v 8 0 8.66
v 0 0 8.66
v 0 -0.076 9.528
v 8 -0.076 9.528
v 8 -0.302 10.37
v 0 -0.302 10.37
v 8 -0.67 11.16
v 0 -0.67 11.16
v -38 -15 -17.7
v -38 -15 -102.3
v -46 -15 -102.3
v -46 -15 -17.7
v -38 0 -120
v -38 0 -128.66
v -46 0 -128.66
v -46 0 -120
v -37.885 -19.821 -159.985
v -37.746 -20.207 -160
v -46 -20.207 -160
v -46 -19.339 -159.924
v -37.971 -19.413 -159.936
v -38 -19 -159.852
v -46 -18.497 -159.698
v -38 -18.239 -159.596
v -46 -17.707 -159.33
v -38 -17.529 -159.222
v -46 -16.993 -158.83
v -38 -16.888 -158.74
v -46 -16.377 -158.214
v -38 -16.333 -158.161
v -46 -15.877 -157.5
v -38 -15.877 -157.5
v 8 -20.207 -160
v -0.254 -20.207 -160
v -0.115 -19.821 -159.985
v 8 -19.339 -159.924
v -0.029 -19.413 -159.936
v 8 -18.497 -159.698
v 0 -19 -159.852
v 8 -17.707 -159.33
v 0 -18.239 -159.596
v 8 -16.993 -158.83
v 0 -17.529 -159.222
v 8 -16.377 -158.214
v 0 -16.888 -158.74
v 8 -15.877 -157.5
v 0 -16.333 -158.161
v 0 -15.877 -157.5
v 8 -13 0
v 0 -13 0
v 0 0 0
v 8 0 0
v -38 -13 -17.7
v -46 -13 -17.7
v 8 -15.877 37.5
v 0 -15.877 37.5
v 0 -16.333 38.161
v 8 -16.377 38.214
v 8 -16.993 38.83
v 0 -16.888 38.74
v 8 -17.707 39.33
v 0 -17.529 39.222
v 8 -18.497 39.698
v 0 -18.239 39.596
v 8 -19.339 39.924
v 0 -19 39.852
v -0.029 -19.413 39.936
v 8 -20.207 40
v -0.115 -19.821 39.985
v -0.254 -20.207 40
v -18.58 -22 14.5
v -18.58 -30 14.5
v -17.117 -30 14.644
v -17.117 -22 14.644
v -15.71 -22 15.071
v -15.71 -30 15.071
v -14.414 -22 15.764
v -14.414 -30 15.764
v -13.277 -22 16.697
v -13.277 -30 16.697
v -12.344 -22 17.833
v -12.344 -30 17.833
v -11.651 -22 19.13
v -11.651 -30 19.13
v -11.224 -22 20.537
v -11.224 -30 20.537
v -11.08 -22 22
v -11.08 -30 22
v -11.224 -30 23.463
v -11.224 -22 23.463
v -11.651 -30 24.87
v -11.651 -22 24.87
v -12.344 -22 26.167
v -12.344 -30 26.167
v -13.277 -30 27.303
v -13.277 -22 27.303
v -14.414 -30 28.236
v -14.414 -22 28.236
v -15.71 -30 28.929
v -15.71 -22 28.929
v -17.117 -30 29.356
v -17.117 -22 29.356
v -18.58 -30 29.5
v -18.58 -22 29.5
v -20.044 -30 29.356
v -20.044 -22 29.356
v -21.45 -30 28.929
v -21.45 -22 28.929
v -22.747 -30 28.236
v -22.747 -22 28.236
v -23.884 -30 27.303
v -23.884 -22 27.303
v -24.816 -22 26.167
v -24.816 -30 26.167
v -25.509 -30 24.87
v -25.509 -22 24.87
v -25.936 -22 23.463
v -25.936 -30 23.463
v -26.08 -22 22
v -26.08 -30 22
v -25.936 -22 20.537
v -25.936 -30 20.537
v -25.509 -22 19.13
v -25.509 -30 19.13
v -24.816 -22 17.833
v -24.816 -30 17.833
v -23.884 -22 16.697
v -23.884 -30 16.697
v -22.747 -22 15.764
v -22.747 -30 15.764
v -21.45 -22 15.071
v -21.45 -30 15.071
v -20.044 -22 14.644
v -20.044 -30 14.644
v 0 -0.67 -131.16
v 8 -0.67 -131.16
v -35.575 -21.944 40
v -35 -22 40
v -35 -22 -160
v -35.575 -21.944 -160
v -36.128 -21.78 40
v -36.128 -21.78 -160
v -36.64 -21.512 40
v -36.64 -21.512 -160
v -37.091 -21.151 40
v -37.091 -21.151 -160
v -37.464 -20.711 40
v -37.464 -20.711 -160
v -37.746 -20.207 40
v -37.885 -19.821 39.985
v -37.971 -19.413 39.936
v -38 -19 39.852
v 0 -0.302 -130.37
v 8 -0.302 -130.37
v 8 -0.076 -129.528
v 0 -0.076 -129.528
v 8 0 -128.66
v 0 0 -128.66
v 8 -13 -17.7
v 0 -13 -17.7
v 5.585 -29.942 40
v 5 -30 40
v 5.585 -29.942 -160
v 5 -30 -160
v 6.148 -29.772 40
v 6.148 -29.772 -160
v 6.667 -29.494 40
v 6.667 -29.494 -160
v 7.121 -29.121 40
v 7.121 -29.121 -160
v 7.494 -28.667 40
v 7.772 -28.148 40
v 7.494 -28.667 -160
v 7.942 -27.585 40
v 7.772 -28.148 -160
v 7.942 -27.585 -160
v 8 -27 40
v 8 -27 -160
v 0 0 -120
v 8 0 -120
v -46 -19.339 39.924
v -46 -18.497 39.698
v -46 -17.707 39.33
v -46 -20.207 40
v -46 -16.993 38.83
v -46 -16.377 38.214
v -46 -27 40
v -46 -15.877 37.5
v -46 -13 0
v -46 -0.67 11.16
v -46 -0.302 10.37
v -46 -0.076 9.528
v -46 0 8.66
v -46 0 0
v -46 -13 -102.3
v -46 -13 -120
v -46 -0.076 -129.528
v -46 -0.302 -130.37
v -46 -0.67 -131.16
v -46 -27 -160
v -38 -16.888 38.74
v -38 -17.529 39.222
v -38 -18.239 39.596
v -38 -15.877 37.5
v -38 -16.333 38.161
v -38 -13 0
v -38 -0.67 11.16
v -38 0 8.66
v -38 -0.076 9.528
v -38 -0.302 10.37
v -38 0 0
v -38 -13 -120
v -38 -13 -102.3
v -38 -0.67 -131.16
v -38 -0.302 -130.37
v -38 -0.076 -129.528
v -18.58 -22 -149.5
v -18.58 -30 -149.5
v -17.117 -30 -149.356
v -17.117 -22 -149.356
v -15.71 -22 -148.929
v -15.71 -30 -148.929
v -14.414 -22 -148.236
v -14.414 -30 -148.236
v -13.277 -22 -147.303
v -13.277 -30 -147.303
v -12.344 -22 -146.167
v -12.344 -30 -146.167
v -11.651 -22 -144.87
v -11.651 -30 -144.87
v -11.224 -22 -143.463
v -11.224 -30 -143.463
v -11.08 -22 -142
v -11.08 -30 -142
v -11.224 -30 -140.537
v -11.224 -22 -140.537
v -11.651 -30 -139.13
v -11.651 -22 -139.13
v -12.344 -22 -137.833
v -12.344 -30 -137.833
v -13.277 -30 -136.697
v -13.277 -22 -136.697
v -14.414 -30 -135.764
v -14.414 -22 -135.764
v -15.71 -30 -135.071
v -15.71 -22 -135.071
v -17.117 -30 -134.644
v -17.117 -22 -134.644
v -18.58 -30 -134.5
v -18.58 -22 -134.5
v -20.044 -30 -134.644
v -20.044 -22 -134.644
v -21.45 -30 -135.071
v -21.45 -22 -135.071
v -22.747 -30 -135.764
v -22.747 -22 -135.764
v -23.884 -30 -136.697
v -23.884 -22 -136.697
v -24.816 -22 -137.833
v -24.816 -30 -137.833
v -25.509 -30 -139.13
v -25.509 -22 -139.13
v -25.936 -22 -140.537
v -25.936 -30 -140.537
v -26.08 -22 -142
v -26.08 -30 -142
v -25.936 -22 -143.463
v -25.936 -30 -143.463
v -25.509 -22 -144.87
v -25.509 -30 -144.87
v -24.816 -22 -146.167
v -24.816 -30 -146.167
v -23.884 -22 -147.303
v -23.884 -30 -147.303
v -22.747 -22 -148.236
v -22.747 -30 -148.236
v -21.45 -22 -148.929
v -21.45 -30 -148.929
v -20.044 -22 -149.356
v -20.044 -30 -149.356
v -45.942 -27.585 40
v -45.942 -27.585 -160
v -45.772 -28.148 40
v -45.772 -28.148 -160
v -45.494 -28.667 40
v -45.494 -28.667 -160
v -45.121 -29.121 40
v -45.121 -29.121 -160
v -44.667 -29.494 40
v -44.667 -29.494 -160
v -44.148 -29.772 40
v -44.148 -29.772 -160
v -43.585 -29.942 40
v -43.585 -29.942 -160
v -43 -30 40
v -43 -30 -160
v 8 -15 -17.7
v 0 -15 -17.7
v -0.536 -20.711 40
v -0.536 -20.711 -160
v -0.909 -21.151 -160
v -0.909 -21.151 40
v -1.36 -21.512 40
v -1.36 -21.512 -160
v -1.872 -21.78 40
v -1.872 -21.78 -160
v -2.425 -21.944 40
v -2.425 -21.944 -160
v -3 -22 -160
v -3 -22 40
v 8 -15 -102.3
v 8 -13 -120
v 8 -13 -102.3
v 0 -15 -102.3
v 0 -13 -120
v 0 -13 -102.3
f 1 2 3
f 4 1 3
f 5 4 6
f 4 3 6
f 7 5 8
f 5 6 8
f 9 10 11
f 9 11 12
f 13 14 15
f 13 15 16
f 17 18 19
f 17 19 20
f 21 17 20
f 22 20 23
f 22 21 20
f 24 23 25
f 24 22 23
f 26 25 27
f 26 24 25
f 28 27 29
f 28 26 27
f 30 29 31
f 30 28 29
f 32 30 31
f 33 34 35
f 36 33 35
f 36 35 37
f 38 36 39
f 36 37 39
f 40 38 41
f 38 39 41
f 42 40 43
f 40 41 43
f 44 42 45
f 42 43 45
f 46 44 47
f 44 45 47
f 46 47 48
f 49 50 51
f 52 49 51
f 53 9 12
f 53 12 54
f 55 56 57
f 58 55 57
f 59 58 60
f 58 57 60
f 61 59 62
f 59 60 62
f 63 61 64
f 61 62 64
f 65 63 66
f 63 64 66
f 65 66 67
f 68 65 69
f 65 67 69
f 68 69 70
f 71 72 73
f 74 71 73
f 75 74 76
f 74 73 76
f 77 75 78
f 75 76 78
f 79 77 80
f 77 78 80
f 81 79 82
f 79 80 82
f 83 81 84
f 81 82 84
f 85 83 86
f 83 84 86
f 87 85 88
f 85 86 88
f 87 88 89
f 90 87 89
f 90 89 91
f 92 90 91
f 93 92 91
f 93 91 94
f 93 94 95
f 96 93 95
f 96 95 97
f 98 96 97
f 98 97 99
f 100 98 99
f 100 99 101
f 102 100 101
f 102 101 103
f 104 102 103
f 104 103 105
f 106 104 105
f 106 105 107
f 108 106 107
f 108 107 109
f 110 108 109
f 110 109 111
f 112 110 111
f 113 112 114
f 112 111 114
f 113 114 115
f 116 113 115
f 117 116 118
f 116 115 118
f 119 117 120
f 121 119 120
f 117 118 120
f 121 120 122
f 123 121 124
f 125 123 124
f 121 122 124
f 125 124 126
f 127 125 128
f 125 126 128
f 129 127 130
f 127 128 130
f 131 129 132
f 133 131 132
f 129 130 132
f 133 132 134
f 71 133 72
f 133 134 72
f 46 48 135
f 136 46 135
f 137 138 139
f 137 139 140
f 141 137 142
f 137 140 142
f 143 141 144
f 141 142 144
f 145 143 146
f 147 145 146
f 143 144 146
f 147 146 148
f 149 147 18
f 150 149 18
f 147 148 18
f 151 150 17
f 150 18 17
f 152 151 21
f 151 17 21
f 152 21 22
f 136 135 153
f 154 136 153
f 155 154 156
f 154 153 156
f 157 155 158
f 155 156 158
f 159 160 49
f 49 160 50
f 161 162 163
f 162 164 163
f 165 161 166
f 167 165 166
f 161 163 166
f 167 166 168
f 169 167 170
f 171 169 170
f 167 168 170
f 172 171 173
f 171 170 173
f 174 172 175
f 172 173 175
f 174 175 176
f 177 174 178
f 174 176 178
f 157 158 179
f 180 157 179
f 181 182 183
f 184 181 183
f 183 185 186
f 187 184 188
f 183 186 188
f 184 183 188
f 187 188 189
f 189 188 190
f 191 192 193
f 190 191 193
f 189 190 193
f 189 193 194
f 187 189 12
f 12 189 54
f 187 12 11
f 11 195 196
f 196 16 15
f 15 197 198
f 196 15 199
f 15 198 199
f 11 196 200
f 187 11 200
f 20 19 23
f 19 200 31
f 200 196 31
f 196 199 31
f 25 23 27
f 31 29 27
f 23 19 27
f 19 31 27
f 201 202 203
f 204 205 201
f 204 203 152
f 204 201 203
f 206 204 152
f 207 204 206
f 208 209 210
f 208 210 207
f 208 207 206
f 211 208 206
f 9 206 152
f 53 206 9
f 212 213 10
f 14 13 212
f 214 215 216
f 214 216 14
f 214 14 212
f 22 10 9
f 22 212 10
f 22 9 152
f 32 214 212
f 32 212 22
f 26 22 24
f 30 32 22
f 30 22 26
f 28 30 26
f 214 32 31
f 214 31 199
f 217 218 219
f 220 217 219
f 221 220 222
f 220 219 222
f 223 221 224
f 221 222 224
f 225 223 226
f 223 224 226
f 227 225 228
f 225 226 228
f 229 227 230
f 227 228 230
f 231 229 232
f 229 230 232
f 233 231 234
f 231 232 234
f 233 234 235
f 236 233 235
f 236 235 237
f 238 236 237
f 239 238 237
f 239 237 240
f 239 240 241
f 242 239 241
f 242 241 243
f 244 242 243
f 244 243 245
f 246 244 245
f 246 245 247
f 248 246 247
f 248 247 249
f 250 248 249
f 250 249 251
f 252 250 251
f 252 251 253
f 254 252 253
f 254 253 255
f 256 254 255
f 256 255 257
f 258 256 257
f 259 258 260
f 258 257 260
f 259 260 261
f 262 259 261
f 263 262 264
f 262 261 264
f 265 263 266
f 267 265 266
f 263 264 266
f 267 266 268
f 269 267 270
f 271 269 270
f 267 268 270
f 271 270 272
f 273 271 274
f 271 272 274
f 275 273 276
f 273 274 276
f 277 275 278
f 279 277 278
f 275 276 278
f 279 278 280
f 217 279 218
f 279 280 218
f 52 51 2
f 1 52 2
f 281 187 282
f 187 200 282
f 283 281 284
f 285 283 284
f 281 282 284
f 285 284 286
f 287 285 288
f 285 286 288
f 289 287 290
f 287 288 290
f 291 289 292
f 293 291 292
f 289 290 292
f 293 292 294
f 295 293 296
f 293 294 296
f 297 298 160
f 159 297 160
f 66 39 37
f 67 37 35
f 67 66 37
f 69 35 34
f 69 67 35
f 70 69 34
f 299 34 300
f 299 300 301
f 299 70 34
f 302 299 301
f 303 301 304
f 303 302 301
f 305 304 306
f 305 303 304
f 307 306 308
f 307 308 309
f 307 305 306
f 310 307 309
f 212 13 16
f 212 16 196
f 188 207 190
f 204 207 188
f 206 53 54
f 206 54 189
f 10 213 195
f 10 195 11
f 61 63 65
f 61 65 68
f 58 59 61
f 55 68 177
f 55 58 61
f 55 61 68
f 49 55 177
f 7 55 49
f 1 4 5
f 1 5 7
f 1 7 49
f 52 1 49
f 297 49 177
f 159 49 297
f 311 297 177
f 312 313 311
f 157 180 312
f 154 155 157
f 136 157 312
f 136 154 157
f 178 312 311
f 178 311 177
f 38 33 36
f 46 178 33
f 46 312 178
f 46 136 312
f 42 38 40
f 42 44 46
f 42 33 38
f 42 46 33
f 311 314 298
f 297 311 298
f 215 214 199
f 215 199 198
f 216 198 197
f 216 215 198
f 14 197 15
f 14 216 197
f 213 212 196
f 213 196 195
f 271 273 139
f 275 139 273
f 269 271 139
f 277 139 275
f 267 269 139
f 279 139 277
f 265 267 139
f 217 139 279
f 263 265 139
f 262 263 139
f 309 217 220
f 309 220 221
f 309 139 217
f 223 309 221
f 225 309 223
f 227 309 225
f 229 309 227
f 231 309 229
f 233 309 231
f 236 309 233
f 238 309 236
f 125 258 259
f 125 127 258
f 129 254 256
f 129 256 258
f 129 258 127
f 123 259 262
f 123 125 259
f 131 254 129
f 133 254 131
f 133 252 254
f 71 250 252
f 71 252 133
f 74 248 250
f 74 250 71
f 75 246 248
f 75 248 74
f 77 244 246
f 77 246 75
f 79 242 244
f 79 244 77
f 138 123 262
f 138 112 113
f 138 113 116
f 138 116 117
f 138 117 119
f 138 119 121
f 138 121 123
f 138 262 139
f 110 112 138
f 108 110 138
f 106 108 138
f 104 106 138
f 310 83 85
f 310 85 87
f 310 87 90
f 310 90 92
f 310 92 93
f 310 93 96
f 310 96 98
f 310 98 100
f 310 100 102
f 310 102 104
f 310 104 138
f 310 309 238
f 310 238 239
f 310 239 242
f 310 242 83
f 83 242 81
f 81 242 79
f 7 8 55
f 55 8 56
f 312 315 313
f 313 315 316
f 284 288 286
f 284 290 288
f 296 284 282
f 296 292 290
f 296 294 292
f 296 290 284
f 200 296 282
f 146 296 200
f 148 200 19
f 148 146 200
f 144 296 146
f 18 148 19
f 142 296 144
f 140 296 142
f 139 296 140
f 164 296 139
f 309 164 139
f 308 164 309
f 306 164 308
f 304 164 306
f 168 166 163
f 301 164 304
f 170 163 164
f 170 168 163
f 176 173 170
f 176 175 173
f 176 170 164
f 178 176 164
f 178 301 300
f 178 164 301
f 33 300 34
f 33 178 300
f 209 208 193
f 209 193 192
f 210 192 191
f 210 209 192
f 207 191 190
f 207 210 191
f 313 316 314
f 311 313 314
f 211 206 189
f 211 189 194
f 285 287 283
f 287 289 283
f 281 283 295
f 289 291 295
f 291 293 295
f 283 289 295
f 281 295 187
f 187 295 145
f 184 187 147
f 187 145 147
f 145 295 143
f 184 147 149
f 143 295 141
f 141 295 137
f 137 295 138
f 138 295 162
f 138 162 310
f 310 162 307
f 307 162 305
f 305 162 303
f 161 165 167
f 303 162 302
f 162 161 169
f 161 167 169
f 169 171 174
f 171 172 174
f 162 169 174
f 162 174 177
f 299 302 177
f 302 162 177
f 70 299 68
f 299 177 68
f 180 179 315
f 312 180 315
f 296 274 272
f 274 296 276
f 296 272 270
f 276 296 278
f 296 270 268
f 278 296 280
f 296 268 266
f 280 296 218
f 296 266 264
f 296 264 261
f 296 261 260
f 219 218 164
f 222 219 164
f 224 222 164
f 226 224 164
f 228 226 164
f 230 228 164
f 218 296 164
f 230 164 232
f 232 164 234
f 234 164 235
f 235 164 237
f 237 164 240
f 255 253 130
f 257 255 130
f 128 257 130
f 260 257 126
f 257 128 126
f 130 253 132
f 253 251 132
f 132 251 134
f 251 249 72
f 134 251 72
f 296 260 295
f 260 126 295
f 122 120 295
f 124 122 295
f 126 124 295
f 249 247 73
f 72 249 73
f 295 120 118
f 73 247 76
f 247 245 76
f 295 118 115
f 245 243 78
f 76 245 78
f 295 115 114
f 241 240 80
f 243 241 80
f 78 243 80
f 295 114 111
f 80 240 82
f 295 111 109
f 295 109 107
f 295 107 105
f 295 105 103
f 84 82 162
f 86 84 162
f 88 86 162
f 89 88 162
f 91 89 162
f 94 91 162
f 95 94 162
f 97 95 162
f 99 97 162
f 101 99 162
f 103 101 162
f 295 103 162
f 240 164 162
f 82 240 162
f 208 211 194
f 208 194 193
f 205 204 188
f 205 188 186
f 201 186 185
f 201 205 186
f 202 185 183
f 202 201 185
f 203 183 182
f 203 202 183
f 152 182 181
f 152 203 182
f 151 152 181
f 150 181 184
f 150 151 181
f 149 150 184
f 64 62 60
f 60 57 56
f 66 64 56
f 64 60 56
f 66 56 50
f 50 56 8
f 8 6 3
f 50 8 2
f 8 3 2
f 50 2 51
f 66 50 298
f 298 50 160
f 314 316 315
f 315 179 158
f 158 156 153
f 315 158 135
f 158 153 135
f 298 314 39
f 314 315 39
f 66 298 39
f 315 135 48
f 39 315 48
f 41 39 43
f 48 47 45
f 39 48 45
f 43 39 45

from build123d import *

# Parameters (mm, degrees)
DODANIE_WYCI_GNI_CIE1_DEPTH = 8
DODANIE_WYCI_GNI_CIE2_REACH = 171.163
SZKIC2_W                    = 200
SZKIC2_H                    = 8
ZAOKR_GLENIE1_R             = 3
ZAOKR_GLENIE2_R             = 3
SZKIC3_R                    = 7.5
WYTNIJ_WYCI_GNI_CIE1_DEPTH  = 170.162643752


with BuildPart() as part:
    # Szkic1 → Dodanie-wyciągnięcie1 (new body)
    with BuildSketch(Plane(origin=(0, 0, 0), x_dir=(0, 0, -1), z_dir=(1, 0, 0))):
        with BuildLine():
            Line((0, 0), (-8.660254038, 0))
            ThreePointArc((-8.660254038, 0), (-9.954349263, -0.170370869), (-11.160254038, -0.669872981))
            Line((-11.160254038, -0.669872981), (-37.5, -15.877132403))
            ThreePointArc((-37.5, -15.877132403), (-39.330127019, -17.707259422), (-40, -20.207259422))
            Line((-40, -20.207259422), (-40, -30))
            Line((-40, -30), (160, -30))
            Line((160, -30), (160, -20.207259422))
            ThreePointArc((160, -20.207259422), (159.330127019, -17.707259422), (157.5, -15.877132403))
            Line((157.5, -15.877132403), (131.160254038, -0.669872981))
            ThreePointArc((131.160254038, -0.669872981), (129.954349263, -0.170370869), (128.660254038, 0))
            Line((128.660254038, 0), (120, 0))
            Line((120, 0), (120, -13))
            Line((120, -13), (102.3, -13))
            Line((102.3, -13), (102.3, -15))
            Line((102.3, -15), (17.7, -15))
            Line((17.7, -15), (17.7, -13))
            Line((17.7, -13), (0, -13))
            Line((0, -13), (0, 0))
        make_face()
    extrude(amount=DODANIE_WYCI_GNI_CIE1_DEPTH)


with BuildPart() as body_2:
    # Lustro3: mirrored copy
    add(part.part.mirror(Plane.ZY.offset(19)))

    # Szkic2 → Dodanie-wyciągnięcie2 (add, up to next)
    with BuildSketch(Plane.ZY, mode=Mode.PRIVATE) as dodanie_wyci_gni_cie2_sk1:
        with Locations((-60, -26)):
            Rectangle(SZKIC2_W, SZKIC2_H)
    dodanie_wyci_gni_cie2_tool1 = extrude(dodanie_wyci_gni_cie2_sk1.sketch, amount=DODANIE_WYCI_GNI_CIE2_REACH, mode=Mode.PRIVATE) - body_2.part

    add(part.part)  # Dodanie-wyciągnięcie2 merges part
    add(dodanie_wyci_gni_cie2_tool1.solids().sort_by_distance((0, -26, -60))[0])

    # Zaokrąglenie1
    zaokr_glenie1_edges = [body_2.edges().sort_by_distance(p)[0] for p in [
        (8, -30, -60),
        (-46, -30, -60),
    ]]
    fillet(zaokr_glenie1_edges, radius=ZAOKR_GLENIE1_R)

    # Zaokrąglenie2
    zaokr_glenie2_edges = [body_2.edges().sort_by_distance(p)[0] for p in [
        (0, -22, -60),
        (-38, -22, -60),
    ]]
    fillet(zaokr_glenie2_edges, radius=ZAOKR_GLENIE2_R)

    # Szkic3 → Wytnij-wyciągnięcie1 (cut, through all)
    with BuildSketch(Plane.XZ.offset(30)):
        with Locations(Location((-18.58033314, 22, 0), (0, 0, 270))):
            Circle(SZKIC3_R)
        with Locations(Location((-18.58033314, -142, 0), (0, 0, 270))):
            Circle(SZKIC3_R)
    extrude(amount=-WYTNIJ_WYCI_GNI_CIE1_DEPTH, mode=Mode.SUBTRACT)


solid = body_2.part
